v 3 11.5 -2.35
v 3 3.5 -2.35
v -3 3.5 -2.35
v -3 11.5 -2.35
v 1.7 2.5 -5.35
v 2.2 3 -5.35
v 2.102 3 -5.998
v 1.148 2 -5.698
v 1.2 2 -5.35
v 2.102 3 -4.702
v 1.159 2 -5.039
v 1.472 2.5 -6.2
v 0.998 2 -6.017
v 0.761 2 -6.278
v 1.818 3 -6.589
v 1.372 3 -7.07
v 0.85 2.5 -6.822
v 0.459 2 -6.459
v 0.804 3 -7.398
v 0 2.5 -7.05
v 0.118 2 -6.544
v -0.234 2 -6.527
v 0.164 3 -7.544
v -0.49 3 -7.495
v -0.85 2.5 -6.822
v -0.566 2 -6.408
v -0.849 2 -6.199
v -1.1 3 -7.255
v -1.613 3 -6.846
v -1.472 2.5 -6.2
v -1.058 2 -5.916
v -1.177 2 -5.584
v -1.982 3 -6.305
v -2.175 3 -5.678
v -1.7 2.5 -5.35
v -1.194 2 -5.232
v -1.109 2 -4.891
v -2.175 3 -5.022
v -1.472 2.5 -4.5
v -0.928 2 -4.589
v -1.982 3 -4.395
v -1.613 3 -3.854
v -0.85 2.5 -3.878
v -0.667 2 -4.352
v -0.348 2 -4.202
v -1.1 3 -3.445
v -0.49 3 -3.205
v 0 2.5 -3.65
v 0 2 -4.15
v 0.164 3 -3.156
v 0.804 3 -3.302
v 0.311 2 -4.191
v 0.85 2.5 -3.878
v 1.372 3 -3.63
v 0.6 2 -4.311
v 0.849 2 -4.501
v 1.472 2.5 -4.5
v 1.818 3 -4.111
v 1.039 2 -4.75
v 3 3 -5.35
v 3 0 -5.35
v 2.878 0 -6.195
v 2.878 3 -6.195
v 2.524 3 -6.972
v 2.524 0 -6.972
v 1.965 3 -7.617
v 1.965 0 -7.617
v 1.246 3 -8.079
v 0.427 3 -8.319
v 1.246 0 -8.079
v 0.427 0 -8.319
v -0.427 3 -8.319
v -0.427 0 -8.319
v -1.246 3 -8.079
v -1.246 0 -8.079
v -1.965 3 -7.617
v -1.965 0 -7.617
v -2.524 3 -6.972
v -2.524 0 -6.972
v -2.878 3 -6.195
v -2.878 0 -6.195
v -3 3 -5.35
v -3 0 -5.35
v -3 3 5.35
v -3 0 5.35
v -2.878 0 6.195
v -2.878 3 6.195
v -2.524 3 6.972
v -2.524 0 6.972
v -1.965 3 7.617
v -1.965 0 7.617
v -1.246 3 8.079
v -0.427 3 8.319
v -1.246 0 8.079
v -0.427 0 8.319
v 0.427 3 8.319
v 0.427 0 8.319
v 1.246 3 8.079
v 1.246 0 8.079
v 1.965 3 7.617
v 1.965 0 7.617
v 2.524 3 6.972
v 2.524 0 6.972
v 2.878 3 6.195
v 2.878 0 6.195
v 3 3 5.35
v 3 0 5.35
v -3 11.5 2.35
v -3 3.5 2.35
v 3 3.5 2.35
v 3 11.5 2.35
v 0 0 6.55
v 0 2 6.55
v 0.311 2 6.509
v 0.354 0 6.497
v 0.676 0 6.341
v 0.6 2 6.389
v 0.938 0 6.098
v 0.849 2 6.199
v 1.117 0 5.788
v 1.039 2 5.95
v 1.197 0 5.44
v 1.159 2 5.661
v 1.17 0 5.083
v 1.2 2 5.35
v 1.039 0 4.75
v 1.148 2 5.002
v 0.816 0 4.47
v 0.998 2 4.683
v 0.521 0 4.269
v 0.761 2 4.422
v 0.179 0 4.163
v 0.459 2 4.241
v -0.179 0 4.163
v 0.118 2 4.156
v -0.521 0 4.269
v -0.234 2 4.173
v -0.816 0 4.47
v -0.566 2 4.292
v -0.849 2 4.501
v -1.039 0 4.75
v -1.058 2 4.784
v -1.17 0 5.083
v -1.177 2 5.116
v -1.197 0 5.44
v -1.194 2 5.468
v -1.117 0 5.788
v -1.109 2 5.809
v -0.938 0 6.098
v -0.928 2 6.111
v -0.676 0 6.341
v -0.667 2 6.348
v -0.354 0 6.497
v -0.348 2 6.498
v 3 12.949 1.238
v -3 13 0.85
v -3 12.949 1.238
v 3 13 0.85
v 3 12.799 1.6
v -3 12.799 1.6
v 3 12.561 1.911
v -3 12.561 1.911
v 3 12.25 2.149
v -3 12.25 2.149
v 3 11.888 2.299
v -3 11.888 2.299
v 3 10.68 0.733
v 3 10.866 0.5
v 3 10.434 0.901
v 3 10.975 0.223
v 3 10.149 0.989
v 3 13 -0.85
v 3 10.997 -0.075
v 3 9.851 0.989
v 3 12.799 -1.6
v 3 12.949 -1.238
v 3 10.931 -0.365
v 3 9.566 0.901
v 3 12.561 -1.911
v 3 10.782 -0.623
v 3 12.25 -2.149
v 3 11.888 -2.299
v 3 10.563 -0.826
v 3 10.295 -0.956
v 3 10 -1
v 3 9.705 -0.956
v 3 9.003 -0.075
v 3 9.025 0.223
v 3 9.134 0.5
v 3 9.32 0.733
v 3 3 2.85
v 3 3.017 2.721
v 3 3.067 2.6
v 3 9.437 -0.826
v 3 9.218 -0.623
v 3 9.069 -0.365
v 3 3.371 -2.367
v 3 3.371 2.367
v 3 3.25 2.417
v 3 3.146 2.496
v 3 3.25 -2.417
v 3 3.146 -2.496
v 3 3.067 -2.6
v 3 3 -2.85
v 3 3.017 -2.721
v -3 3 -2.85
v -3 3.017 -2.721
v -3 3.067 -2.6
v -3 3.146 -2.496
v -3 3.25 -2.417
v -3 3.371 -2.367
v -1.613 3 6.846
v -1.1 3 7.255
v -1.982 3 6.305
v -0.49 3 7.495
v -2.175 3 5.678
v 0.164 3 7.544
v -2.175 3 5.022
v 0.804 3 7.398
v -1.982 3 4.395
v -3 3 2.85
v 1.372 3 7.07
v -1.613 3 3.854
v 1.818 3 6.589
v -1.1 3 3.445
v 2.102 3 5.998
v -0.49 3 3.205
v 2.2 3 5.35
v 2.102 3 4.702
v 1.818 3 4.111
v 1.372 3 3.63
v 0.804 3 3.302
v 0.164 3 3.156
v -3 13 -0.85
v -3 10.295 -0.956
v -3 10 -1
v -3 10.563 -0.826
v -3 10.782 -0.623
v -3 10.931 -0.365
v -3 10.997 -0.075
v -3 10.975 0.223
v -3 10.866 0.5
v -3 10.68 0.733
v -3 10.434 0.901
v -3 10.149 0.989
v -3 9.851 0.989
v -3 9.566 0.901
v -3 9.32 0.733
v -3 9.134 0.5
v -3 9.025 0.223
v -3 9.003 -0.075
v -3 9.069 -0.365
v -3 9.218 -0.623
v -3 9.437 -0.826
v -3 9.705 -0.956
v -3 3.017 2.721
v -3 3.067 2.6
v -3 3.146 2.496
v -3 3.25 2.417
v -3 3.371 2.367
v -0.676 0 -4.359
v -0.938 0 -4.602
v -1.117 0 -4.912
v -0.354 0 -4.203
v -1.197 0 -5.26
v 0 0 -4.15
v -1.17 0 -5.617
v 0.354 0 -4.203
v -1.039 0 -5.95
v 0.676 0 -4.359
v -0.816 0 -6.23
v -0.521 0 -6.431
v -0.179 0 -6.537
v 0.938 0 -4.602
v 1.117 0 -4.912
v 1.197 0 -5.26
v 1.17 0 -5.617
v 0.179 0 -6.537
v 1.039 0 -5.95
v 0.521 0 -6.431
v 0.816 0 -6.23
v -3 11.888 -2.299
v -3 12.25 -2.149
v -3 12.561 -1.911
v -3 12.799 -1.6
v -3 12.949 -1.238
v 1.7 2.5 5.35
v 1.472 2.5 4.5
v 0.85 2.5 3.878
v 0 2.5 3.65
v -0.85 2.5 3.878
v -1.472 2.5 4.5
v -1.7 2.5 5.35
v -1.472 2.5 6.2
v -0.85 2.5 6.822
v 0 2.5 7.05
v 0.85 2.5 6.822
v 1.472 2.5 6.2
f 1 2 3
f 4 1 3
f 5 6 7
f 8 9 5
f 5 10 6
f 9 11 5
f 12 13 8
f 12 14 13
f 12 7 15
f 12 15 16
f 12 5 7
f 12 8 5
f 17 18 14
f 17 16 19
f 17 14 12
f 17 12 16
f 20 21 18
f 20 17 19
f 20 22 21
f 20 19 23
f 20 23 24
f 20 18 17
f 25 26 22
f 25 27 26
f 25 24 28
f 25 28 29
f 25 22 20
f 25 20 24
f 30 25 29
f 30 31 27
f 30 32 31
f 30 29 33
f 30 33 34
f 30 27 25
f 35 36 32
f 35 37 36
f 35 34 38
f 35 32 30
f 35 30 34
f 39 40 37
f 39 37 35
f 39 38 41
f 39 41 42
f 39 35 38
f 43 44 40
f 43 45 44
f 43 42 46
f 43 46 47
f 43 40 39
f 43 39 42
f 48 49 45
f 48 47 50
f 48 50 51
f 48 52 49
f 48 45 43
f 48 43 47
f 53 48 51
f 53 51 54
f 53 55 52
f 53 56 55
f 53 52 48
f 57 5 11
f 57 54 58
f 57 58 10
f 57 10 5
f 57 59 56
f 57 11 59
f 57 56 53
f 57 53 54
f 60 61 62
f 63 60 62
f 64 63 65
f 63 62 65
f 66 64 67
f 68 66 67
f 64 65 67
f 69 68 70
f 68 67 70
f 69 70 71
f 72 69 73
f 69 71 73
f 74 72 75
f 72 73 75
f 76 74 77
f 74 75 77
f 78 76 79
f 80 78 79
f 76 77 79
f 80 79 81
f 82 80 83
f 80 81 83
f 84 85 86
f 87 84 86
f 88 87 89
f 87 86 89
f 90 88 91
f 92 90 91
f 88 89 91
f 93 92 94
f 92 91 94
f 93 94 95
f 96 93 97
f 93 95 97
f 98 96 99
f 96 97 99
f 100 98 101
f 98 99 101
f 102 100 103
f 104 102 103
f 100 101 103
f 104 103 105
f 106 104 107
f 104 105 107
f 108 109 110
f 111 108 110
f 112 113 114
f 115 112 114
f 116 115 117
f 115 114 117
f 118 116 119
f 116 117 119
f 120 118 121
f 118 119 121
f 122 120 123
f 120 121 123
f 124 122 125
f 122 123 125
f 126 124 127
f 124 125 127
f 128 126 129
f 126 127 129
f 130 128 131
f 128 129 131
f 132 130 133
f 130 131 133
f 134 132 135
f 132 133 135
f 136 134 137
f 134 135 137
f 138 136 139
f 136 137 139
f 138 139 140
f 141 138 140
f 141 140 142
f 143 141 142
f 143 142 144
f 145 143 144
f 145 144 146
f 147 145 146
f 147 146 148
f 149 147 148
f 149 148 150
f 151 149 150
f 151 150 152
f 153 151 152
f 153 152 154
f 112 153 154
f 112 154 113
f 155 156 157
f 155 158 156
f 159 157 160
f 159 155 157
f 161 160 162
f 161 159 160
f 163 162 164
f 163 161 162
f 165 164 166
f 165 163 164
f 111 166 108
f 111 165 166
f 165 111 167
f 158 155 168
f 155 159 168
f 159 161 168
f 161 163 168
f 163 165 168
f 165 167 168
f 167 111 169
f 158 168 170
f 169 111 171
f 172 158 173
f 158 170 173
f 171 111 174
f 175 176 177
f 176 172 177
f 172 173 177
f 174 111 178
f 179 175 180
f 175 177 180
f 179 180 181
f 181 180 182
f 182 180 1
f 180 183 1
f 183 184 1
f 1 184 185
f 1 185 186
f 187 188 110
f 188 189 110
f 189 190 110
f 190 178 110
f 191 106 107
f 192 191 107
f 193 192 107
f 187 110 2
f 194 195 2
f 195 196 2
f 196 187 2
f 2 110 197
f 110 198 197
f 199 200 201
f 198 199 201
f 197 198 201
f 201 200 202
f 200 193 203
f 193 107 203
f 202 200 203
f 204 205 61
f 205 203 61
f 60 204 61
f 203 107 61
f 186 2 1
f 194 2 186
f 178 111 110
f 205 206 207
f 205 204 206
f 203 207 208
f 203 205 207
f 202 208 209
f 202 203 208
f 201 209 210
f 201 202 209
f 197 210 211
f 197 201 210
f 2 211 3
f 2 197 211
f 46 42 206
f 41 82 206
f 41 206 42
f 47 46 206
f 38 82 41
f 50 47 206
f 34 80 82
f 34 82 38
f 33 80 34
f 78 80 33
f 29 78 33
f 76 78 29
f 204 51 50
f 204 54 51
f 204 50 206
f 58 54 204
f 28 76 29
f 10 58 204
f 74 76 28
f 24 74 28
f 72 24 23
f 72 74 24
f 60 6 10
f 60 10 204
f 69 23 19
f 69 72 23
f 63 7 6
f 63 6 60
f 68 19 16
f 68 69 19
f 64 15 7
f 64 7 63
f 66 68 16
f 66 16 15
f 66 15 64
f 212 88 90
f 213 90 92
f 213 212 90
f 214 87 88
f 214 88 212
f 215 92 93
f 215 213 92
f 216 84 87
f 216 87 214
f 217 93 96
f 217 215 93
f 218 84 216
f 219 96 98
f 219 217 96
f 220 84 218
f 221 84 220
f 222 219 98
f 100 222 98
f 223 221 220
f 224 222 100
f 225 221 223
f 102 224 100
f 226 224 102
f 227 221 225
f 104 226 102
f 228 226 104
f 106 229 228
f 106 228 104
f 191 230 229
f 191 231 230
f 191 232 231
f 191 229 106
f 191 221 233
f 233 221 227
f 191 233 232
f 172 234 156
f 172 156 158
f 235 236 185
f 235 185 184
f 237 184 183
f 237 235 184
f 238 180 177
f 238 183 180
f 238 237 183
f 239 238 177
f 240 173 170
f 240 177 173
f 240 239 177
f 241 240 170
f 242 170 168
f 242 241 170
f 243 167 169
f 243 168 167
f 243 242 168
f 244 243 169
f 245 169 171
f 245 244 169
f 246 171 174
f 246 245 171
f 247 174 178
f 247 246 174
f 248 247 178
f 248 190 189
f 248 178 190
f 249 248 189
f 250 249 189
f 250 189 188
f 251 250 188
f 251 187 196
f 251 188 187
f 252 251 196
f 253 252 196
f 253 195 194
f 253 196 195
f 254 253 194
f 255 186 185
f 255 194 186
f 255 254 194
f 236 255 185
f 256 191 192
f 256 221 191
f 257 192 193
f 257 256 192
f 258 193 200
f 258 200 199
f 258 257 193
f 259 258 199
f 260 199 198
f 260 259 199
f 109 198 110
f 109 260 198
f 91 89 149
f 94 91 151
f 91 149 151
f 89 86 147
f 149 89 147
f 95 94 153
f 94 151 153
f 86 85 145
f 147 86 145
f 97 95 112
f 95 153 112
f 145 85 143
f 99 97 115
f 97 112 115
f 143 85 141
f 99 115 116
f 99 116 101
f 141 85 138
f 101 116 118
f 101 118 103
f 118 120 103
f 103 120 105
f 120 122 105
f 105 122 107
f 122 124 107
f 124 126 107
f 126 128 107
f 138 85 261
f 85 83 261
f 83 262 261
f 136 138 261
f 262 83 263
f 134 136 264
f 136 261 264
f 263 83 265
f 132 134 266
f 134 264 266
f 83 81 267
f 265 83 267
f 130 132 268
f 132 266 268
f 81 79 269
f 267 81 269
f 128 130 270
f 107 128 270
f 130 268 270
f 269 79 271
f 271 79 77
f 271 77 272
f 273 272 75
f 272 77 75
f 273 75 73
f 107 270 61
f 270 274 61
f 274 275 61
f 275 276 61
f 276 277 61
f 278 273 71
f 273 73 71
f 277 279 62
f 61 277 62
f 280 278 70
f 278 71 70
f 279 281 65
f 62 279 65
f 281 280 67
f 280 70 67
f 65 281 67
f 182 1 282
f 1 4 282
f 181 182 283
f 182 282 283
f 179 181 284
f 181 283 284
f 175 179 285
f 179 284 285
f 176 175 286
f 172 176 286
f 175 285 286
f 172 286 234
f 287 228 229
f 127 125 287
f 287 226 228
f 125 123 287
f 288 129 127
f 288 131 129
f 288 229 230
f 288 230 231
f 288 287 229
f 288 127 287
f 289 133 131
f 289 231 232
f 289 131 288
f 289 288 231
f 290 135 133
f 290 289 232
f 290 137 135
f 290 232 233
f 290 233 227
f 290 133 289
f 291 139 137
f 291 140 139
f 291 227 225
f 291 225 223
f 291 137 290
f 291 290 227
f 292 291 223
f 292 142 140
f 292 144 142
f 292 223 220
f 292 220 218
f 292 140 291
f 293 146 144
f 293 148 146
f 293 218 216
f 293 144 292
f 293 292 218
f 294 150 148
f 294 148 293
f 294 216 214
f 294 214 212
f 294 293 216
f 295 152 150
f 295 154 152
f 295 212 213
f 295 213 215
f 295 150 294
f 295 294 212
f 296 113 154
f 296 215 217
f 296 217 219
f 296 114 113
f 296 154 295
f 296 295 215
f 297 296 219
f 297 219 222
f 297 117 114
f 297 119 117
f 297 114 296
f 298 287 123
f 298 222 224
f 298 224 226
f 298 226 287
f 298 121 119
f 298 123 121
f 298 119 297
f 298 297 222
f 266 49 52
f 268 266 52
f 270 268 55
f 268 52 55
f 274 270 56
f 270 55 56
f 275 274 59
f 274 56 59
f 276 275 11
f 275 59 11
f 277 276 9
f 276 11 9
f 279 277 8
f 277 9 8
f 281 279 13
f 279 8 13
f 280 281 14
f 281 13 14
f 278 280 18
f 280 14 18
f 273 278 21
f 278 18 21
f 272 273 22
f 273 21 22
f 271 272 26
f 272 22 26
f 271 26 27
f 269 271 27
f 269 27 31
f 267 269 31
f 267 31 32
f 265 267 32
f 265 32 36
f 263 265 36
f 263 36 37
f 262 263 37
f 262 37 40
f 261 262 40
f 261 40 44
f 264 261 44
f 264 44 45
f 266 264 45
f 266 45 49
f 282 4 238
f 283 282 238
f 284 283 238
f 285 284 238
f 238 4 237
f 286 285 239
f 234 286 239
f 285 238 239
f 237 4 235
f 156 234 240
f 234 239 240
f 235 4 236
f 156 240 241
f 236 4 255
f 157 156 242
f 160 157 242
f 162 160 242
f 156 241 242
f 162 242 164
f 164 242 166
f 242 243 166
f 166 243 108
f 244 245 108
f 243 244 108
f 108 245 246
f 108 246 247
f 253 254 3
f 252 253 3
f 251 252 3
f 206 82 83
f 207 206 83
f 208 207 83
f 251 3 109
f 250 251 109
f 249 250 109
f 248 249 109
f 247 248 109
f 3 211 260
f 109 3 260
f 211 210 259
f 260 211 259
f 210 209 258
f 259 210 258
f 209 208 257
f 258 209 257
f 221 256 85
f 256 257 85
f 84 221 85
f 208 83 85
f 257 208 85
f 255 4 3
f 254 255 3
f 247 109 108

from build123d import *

# Parameters (mm, degrees)
CROQUIS1_W                   = 3
CROQUIS1_H                   = 4.7
SALIENTE_EXTRUIR1_DEPTH      = 13
SALIENTE_EXTRUIR2_DEPTH      = 3
CORTAR_EXTRUIR1_DEPTH        = 17.5747549
CORTAR_EXTRUIR1_DEPTH_BACK   = 17.5747549
CROQUIS2_R                   = 1
REDONDEO1_R                  = 0.5
TALADROAVANZADO1_OUTLINE_R   = 1.2
TALADROAVANZADO1_DEPTH       = 1
TALADROAVANZADO1_DRAFT       = -45
TALADROAVANZADO1_2_OUTLINE_R = 1.2
TALADROAVANZADO1_2_DEPTH     = 1
TALADROAVANZADO1_2_DRAFT     = -45
REDONDEO2_R                  = 1.5
CORTAR_EXTRUIR2_REACH        = 16.132
CROQUIS4_R                   = 1.2


# Read off the part's stored shape, not the designer's step: TaladroAvanzado1
with BuildPart() as part:
    # Croquis1 → Saliente-Extruir1 (new body)
    with BuildSketch(Plane(origin=(0, 0, 0), x_dir=(1, 0, 0), z_dir=(0, 1, 0))):
        with Locations((-1.5, 0)):
            Rectangle(CROQUIS1_W, CROQUIS1_H)
        with Locations((1.5, 0)):
            Rectangle(CROQUIS1_W, CROQUIS1_H)
    extrude(amount=SALIENTE_EXTRUIR1_DEPTH)

    # Croquis1<3> → Saliente-Extruir2 (add)
    with BuildSketch(Plane(origin=(0, 0, 0), x_dir=(1, 0, 0), z_dir=(0, 1, 0))):
        with BuildLine():
            Line((3, 2.35), (3, 5.35))
            ThreePointArc((3, 5.35), (0, 8.35), (-3, 5.35))
            Line((-3, 5.35), (-3, 2.35))
            Line((-3, 2.35), (3, 2.35))
        make_face()
        with BuildLine():
            Line((3, -5.35), (3, -2.35))
            Line((3, -2.35), (-3, -2.35))
            Line((-3, -2.35), (-3, -5.35))
            ThreePointArc((-3, -5.35), (0, -8.35), (3, -5.35))
        make_face()
    extrude(amount=SALIENTE_EXTRUIR2_DEPTH)

    # Croquis2 → Cortar-Extruir1 (cut, two sides: drawn at the far end of the back side and taken through both)
    with BuildSketch(Plane(origin=(3, 0, 0), x_dir=(0, 0, -1), z_dir=(1, 0, 0)).offset(-CORTAR_EXTRUIR1_DEPTH_BACK)):
        with Locations((0, 10)):
            Circle(CROQUIS2_R)
    extrude(amount=CORTAR_EXTRUIR1_DEPTH + CORTAR_EXTRUIR1_DEPTH_BACK, mode=Mode.SUBTRACT)

    # Redondeo1
    redondeo1_edges = [part.edges().sort_by_distance(p)[0] for p in [
        (0, 3, 2.35),
        (0, 3, -2.35),
    ]]
    fillet(redondeo1_edges, radius=REDONDEO1_R)


with BuildPart() as taladroavanzado1_tool:
    # TaladroAvanzado1 outline → TaladroAvanzado1 (with draft: the straight prism first)
    with BuildSketch(Plane(origin=(0, 2, 0), x_dir=(1, 0, 0), z_dir=(0, 1, 0))):
        with Locations((0, 5.35)):
            Circle(TALADROAVANZADO1_OUTLINE_R)
    extrude(amount=TALADROAVANZADO1_DEPTH)
    # TaladroAvanzado1: the draft: its side faces are tilted about the plane it starts from
    taladroavanzado1_sides = [taladroavanzado1_tool.faces().sort_by_distance(p)[0] for p in [
        (-1.2, 2.5, -5.35),
    ]]
    draft(taladroavanzado1_sides, Plane(origin=(0, 2, 0), x_dir=(1, 0, 0), z_dir=(0, 1, 0)), TALADROAVANZADO1_DRAFT)


with BuildPart() as part_1:
    add(part.part)

    # TaladroAvanzado1: cut by taladroavanzado1_tool
    add(taladroavanzado1_tool.part, mode=Mode.SUBTRACT)


with BuildPart() as taladroavanzado1_2_tool:
    # TaladroAvanzado1 2 outline → TaladroAvanzado1 2 (with draft: the straight prism first)
    with BuildSketch(Plane(origin=(0, 2, 0), x_dir=(1, 0, 0), z_dir=(0, 1, 0))):
        with Locations((0, -5.35)):
            Circle(TALADROAVANZADO1_2_OUTLINE_R)
    extrude(amount=TALADROAVANZADO1_2_DEPTH)
    # TaladroAvanzado1 2: the draft: its side faces are tilted about the plane it starts from
    taladroavanzado1_2_sides = [taladroavanzado1_2_tool.faces().sort_by_distance(p)[0] for p in [
        (-1.2, 2.5, 5.35),
    ]]
    draft(taladroavanzado1_2_sides, Plane(origin=(0, 2, 0), x_dir=(1, 0, 0), z_dir=(0, 1, 0)), TALADROAVANZADO1_2_DRAFT)


with BuildPart() as part_2:
    add(part_1.part)

    # TaladroAvanzado1 2: cut by taladroavanzado1_2_tool
    add(taladroavanzado1_2_tool.part, mode=Mode.SUBTRACT)

    # Redondeo2
    redondeo2_edges = [part_2.edges().sort_by_distance(p)[0] for p in [
        (0, 13, -2.35),
        (0, 13, 2.35),
    ]]
    fillet(redondeo2_edges, radius=REDONDEO2_R)

    # Croquis4 → Cortar-Extruir2 (cut, up to next)
    with BuildSketch(Plane(origin=(0, 2, 0), x_dir=(1, 0, 0), z_dir=(0, 1, 0)), mode=Mode.PRIVATE) as cortar_extruir2_sk1:
        with Locations(Location((0, -5.35, 0), (0, 0, 270))):
            Circle(CROQUIS4_R)
    cortar_extruir2_tool1 = extrude(cortar_extruir2_sk1.sketch, amount=-CORTAR_EXTRUIR2_REACH, mode=Mode.PRIVATE) & part_2.part
    # Croquis4 → Cortar-Extruir2 (cut, up to next)
    with BuildSketch(Plane(origin=(0, 2, 0), x_dir=(1, 0, 0), z_dir=(0, 1, 0)), mode=Mode.PRIVATE) as cortar_extruir2_sk2:
        with Locations(Location((0, 5.35, 0), (0, 0, 270))):
            Circle(CROQUIS4_R)
    cortar_extruir2_tool2 = extrude(cortar_extruir2_sk2.sketch, amount=-CORTAR_EXTRUIR2_REACH, mode=Mode.PRIVATE) & part_2.part
    add(cortar_extruir2_tool1.solids().sort_by_distance((0, 2, 5.35))[0], mode=Mode.SUBTRACT)
    add(cortar_extruir2_tool2.solids().sort_by_distance((0, 2, -5.35))[0], mode=Mode.SUBTRACT)


solid = part_2.part
